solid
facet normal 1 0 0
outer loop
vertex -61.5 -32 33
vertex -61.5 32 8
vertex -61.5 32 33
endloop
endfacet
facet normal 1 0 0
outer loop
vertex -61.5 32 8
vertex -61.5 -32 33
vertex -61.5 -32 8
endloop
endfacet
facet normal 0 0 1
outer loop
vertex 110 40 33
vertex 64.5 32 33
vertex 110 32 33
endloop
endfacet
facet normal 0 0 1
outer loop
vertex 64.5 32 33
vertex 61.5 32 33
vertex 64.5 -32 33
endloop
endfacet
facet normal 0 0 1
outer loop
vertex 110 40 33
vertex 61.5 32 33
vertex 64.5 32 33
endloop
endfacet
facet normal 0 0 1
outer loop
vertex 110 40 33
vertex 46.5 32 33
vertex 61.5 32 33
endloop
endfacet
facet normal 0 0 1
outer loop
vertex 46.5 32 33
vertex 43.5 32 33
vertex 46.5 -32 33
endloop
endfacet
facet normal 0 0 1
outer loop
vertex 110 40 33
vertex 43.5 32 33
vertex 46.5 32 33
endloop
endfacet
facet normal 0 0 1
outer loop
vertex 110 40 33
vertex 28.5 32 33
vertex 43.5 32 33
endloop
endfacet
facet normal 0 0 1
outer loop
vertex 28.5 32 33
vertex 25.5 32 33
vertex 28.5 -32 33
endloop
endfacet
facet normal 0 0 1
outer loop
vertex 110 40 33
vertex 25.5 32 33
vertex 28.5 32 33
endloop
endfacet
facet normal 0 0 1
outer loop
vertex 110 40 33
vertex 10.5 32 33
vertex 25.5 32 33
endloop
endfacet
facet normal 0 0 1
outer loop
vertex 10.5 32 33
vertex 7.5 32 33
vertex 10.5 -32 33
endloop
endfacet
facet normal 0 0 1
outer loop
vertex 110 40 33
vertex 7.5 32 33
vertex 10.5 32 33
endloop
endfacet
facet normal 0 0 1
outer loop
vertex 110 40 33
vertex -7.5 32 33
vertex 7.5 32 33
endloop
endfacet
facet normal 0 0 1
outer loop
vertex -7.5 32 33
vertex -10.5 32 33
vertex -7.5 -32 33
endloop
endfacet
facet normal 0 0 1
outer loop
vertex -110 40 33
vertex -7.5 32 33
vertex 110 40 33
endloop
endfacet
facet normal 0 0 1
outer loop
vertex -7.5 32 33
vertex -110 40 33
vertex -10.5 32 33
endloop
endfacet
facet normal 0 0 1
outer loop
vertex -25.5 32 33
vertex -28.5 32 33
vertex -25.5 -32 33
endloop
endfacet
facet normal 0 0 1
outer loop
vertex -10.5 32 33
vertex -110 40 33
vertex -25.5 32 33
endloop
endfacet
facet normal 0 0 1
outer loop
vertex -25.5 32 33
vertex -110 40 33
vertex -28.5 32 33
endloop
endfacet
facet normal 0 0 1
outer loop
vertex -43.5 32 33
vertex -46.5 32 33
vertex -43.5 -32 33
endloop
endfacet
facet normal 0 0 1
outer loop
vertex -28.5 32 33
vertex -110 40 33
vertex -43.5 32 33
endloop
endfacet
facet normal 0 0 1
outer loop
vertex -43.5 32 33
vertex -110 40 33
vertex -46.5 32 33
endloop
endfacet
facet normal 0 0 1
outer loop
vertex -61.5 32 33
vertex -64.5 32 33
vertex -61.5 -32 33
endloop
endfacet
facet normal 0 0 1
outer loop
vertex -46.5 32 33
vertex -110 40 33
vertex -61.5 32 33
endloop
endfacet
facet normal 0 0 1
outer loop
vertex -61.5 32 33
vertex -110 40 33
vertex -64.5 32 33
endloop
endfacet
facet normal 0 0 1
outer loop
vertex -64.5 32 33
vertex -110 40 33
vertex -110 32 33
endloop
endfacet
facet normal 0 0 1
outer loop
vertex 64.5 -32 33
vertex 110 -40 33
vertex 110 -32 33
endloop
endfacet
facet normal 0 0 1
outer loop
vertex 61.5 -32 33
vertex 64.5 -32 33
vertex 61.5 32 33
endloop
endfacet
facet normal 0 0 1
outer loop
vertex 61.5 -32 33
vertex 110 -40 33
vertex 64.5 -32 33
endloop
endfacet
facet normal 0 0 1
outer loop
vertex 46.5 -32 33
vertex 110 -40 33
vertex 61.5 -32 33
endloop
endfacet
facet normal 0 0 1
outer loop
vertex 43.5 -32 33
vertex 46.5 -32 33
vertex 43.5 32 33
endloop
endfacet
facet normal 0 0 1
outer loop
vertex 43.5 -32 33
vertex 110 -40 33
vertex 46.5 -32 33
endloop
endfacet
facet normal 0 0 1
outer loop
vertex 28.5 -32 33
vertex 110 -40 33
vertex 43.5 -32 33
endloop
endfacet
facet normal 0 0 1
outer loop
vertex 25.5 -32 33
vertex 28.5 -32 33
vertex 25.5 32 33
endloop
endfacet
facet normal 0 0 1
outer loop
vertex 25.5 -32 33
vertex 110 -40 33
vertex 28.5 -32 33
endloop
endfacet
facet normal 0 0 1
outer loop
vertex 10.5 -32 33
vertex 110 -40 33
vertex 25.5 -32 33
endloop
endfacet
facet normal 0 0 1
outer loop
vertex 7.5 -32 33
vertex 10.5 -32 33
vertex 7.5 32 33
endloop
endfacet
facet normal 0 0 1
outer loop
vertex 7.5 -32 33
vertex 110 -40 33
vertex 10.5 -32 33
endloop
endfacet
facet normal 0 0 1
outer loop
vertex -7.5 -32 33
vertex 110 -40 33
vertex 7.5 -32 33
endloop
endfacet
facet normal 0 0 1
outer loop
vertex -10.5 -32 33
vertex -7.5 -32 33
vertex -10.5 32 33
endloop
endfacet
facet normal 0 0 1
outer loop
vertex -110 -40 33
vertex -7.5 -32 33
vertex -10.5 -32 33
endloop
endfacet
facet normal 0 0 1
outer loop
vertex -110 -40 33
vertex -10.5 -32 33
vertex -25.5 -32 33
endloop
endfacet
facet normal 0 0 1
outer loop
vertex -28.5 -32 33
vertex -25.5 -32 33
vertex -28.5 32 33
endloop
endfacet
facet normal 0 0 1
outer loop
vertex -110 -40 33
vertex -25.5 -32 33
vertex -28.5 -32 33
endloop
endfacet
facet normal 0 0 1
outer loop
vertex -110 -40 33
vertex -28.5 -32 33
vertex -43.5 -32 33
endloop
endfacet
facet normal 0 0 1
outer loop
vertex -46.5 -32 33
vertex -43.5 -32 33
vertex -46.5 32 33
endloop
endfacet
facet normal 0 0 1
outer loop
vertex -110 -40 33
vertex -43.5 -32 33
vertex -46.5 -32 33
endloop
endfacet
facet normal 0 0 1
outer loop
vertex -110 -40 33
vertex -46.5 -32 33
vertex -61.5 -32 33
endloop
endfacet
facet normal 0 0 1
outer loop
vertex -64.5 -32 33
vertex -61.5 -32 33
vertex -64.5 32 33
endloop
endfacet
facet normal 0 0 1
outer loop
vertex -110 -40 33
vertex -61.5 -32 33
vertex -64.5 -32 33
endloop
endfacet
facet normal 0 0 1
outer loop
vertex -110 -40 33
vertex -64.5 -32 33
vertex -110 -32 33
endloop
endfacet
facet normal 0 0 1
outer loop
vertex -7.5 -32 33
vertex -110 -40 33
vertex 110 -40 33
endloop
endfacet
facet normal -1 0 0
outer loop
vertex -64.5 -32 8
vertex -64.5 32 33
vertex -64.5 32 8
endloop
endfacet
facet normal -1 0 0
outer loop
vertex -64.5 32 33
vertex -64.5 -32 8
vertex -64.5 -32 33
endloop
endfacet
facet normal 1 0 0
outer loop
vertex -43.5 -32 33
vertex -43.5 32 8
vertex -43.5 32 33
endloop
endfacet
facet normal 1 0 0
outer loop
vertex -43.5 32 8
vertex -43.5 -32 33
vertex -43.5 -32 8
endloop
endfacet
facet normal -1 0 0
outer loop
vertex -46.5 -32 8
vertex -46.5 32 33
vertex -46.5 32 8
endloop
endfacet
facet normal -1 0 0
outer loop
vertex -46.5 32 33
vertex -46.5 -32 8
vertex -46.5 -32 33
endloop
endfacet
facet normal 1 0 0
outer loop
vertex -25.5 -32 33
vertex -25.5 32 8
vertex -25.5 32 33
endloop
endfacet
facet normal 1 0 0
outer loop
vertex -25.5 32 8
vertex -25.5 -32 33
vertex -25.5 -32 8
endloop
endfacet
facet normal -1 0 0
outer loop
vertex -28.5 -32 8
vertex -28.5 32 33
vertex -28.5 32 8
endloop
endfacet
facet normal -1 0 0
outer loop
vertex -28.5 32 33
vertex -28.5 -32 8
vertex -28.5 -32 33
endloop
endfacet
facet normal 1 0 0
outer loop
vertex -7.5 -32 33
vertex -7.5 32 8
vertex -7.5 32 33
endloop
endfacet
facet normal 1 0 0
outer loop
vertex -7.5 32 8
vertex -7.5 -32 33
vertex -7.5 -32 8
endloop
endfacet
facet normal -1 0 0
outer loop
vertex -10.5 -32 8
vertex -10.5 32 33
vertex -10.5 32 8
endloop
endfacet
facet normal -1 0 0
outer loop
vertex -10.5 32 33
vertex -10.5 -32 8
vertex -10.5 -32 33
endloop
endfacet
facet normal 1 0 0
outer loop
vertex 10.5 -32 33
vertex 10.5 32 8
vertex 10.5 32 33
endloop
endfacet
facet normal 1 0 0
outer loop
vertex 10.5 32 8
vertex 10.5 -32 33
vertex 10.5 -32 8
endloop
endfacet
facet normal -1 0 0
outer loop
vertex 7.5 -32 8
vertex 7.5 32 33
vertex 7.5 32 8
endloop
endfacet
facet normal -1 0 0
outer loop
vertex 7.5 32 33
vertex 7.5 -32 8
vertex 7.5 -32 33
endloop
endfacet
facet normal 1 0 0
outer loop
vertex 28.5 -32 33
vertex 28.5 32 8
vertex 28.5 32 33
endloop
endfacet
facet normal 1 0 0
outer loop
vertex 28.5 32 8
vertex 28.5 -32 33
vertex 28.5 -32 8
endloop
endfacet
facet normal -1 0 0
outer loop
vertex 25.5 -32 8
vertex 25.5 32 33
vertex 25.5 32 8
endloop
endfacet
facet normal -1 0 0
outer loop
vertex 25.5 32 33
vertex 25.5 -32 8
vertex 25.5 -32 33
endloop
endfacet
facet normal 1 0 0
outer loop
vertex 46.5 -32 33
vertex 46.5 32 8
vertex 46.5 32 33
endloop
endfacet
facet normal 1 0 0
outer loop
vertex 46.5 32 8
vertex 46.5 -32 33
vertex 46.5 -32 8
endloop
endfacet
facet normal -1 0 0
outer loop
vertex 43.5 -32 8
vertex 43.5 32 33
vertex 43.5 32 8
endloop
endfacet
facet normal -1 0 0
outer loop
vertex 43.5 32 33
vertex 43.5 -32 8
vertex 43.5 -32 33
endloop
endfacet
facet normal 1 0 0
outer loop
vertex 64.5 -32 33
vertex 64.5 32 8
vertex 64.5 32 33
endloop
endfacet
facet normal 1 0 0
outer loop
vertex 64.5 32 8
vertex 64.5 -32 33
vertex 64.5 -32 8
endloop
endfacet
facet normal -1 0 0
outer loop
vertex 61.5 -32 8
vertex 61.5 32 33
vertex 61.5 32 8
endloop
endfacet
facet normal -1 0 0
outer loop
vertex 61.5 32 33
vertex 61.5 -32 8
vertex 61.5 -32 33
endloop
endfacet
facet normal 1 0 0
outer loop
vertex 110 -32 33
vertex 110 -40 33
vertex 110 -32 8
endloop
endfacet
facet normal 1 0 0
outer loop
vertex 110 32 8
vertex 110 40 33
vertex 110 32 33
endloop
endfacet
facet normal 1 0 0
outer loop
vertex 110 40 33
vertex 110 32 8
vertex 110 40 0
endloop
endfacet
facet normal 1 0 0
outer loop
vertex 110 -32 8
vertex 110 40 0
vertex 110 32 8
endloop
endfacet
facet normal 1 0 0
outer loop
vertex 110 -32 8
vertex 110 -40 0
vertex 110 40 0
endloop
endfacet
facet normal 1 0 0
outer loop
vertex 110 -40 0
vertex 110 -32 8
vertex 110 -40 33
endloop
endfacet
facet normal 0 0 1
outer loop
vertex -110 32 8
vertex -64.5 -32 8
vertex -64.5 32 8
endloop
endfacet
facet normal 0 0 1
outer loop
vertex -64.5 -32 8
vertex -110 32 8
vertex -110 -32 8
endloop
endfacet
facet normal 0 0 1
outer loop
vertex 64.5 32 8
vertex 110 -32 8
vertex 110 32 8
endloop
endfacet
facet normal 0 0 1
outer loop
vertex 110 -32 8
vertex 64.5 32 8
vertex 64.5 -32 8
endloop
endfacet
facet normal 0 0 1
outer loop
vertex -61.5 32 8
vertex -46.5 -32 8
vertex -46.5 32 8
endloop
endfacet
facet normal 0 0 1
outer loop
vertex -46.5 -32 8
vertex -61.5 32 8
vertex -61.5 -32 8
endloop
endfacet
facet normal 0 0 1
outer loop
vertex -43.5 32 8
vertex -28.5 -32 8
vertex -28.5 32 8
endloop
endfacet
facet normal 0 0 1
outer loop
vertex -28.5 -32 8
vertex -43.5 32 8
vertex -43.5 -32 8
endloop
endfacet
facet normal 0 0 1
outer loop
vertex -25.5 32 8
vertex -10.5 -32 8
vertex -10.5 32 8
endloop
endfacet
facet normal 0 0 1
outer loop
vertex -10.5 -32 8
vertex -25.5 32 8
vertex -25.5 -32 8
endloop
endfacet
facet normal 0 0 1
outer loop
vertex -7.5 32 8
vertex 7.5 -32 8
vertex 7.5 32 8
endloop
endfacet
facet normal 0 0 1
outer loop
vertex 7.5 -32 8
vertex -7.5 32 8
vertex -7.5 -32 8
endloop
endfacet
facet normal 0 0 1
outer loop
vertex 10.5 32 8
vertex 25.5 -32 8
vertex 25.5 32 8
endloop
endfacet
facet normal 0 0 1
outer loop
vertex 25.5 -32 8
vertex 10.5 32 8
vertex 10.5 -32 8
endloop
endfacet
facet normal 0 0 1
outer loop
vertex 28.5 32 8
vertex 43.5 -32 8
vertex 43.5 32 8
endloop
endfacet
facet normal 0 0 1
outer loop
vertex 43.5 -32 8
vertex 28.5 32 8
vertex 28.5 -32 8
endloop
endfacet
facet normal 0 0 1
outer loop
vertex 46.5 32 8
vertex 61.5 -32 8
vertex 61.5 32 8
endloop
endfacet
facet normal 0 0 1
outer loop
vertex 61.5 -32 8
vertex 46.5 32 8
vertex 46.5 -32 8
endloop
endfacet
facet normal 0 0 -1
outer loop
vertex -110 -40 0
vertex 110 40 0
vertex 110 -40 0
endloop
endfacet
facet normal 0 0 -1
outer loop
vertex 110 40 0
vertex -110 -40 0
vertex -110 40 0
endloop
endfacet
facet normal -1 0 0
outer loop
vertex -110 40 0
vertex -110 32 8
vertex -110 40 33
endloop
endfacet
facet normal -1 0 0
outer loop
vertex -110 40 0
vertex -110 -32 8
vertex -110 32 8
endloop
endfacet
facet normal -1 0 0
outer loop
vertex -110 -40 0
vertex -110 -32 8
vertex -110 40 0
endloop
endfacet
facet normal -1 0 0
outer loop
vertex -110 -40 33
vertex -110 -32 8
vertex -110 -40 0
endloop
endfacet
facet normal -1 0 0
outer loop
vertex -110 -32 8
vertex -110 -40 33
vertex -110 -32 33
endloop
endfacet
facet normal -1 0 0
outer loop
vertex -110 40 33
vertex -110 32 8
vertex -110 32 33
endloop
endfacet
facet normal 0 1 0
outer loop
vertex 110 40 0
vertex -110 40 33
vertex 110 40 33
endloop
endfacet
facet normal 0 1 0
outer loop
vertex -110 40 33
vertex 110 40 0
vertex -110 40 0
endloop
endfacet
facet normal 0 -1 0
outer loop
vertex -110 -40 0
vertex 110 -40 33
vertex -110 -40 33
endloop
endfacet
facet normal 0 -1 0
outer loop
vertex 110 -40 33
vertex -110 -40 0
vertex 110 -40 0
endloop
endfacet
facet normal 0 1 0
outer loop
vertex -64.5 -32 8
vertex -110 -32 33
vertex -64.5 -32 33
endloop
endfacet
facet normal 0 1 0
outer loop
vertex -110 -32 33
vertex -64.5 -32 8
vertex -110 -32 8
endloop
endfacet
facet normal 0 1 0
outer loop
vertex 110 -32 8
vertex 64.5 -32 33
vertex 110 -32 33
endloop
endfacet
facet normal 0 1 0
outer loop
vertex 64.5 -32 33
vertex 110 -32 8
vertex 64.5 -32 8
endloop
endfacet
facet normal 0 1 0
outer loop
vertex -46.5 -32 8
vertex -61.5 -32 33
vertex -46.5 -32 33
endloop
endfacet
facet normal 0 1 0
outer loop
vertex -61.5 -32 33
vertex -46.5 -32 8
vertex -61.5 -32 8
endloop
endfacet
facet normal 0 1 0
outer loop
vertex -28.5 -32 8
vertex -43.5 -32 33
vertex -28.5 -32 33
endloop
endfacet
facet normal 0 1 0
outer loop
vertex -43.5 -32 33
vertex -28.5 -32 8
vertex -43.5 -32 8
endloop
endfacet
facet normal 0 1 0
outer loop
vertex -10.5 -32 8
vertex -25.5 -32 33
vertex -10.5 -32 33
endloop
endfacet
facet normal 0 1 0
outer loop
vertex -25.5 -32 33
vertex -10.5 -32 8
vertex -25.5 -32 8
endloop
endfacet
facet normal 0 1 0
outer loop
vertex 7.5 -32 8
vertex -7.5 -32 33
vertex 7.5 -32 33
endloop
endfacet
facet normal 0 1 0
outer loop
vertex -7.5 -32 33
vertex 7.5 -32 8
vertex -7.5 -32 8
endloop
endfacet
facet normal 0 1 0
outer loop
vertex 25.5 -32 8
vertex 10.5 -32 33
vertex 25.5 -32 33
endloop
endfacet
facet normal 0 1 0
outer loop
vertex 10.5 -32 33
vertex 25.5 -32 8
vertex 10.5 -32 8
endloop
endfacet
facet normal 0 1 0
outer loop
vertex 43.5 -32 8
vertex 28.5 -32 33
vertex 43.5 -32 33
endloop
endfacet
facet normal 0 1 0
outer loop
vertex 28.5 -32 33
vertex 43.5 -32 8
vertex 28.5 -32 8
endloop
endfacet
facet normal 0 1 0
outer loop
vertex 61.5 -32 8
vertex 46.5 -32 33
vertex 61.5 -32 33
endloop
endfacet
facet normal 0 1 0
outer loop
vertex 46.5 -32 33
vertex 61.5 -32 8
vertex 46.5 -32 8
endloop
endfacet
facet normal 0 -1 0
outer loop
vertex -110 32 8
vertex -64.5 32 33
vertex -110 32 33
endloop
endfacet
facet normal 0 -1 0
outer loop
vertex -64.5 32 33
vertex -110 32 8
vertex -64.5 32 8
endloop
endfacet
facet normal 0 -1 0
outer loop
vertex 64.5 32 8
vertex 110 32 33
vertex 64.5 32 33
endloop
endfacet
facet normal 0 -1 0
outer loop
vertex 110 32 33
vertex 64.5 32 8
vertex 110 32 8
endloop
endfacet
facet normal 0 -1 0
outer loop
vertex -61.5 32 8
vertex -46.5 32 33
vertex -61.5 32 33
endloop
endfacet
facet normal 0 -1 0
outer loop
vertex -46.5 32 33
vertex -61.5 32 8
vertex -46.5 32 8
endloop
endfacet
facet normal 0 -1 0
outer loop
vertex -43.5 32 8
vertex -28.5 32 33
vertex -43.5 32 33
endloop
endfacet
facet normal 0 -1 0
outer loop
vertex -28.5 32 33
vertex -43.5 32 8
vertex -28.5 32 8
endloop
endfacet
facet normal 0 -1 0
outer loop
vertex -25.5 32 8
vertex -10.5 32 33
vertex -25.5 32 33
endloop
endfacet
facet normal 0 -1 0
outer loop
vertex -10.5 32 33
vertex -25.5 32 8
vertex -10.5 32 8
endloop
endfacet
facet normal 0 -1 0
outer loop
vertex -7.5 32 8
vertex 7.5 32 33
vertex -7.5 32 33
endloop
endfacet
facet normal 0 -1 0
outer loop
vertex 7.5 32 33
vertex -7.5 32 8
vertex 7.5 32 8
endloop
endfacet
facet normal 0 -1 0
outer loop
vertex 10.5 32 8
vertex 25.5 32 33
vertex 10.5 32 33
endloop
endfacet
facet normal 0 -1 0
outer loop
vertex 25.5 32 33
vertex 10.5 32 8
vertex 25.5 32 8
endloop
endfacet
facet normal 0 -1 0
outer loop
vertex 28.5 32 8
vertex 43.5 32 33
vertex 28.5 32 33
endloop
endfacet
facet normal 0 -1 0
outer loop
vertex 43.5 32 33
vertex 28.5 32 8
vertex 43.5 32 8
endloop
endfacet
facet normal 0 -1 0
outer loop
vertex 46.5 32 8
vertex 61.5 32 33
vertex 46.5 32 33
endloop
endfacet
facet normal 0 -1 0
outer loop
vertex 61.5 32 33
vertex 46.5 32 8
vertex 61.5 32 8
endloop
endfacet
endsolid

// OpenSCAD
$fn = 32;

// ----------------------------------------------------------------------
// Rib frame 220 x 80 x 33
// 8 ribs at 18 mm pitch
// ----------------------------------------------------------------------

// --- parameters (mm) ---
frame = [220, 80, 8];  // base plate size (x, y, z)
rail_w = 8;            // side rail width
ribs = 8;              // number of ribs
rib_t = 3;             // rib thickness
rib_h = 25;            // rib height above the base plate
pitch = 18;            // pitch between rib centres

// --- derived feature positions (mm) ---
span = (ribs - 1) * pitch;          // = 126   distance between the outer ribs
origin_x = -span / 2;               // = -63   X of the first rib
rib_len = frame[1] - 2 * rail_w + 2;  // = 66   rib length, 1 mm into each rail
feature_centers = [
  [origin_x + 0 * pitch, 0],
  [origin_x + 1 * pitch, 0],
  [origin_x + 2 * pitch, 0],
  [origin_x + 3 * pitch, 0],
  [origin_x + 4 * pitch, 0],
  [origin_x + 5 * pitch, 0],
  [origin_x + 6 * pitch, 0],
  [origin_x + 7 * pitch, 0]
];   // rib centre line, drives the rib loop

// base plate, two side rails, then the ribs read straight off feature_centers
union() {
  translate([-frame[0] / 2, -frame[1] / 2, 0]) cube(frame);
  translate([-frame[0] / 2, -frame[1] / 2, 0]) cube([frame[0], rail_w, frame[2] + rib_h]);
  translate([-frame[0] / 2, frame[1] / 2 - rail_w, 0]) cube([frame[0], rail_w, frame[2] + rib_h]);
  for (centre = feature_centers)
    translate([centre[0] - rib_t / 2, centre[1] - rib_len / 2, frame[2] - 1])
      cube([rib_t, rib_len, rib_h + 1]);
}
